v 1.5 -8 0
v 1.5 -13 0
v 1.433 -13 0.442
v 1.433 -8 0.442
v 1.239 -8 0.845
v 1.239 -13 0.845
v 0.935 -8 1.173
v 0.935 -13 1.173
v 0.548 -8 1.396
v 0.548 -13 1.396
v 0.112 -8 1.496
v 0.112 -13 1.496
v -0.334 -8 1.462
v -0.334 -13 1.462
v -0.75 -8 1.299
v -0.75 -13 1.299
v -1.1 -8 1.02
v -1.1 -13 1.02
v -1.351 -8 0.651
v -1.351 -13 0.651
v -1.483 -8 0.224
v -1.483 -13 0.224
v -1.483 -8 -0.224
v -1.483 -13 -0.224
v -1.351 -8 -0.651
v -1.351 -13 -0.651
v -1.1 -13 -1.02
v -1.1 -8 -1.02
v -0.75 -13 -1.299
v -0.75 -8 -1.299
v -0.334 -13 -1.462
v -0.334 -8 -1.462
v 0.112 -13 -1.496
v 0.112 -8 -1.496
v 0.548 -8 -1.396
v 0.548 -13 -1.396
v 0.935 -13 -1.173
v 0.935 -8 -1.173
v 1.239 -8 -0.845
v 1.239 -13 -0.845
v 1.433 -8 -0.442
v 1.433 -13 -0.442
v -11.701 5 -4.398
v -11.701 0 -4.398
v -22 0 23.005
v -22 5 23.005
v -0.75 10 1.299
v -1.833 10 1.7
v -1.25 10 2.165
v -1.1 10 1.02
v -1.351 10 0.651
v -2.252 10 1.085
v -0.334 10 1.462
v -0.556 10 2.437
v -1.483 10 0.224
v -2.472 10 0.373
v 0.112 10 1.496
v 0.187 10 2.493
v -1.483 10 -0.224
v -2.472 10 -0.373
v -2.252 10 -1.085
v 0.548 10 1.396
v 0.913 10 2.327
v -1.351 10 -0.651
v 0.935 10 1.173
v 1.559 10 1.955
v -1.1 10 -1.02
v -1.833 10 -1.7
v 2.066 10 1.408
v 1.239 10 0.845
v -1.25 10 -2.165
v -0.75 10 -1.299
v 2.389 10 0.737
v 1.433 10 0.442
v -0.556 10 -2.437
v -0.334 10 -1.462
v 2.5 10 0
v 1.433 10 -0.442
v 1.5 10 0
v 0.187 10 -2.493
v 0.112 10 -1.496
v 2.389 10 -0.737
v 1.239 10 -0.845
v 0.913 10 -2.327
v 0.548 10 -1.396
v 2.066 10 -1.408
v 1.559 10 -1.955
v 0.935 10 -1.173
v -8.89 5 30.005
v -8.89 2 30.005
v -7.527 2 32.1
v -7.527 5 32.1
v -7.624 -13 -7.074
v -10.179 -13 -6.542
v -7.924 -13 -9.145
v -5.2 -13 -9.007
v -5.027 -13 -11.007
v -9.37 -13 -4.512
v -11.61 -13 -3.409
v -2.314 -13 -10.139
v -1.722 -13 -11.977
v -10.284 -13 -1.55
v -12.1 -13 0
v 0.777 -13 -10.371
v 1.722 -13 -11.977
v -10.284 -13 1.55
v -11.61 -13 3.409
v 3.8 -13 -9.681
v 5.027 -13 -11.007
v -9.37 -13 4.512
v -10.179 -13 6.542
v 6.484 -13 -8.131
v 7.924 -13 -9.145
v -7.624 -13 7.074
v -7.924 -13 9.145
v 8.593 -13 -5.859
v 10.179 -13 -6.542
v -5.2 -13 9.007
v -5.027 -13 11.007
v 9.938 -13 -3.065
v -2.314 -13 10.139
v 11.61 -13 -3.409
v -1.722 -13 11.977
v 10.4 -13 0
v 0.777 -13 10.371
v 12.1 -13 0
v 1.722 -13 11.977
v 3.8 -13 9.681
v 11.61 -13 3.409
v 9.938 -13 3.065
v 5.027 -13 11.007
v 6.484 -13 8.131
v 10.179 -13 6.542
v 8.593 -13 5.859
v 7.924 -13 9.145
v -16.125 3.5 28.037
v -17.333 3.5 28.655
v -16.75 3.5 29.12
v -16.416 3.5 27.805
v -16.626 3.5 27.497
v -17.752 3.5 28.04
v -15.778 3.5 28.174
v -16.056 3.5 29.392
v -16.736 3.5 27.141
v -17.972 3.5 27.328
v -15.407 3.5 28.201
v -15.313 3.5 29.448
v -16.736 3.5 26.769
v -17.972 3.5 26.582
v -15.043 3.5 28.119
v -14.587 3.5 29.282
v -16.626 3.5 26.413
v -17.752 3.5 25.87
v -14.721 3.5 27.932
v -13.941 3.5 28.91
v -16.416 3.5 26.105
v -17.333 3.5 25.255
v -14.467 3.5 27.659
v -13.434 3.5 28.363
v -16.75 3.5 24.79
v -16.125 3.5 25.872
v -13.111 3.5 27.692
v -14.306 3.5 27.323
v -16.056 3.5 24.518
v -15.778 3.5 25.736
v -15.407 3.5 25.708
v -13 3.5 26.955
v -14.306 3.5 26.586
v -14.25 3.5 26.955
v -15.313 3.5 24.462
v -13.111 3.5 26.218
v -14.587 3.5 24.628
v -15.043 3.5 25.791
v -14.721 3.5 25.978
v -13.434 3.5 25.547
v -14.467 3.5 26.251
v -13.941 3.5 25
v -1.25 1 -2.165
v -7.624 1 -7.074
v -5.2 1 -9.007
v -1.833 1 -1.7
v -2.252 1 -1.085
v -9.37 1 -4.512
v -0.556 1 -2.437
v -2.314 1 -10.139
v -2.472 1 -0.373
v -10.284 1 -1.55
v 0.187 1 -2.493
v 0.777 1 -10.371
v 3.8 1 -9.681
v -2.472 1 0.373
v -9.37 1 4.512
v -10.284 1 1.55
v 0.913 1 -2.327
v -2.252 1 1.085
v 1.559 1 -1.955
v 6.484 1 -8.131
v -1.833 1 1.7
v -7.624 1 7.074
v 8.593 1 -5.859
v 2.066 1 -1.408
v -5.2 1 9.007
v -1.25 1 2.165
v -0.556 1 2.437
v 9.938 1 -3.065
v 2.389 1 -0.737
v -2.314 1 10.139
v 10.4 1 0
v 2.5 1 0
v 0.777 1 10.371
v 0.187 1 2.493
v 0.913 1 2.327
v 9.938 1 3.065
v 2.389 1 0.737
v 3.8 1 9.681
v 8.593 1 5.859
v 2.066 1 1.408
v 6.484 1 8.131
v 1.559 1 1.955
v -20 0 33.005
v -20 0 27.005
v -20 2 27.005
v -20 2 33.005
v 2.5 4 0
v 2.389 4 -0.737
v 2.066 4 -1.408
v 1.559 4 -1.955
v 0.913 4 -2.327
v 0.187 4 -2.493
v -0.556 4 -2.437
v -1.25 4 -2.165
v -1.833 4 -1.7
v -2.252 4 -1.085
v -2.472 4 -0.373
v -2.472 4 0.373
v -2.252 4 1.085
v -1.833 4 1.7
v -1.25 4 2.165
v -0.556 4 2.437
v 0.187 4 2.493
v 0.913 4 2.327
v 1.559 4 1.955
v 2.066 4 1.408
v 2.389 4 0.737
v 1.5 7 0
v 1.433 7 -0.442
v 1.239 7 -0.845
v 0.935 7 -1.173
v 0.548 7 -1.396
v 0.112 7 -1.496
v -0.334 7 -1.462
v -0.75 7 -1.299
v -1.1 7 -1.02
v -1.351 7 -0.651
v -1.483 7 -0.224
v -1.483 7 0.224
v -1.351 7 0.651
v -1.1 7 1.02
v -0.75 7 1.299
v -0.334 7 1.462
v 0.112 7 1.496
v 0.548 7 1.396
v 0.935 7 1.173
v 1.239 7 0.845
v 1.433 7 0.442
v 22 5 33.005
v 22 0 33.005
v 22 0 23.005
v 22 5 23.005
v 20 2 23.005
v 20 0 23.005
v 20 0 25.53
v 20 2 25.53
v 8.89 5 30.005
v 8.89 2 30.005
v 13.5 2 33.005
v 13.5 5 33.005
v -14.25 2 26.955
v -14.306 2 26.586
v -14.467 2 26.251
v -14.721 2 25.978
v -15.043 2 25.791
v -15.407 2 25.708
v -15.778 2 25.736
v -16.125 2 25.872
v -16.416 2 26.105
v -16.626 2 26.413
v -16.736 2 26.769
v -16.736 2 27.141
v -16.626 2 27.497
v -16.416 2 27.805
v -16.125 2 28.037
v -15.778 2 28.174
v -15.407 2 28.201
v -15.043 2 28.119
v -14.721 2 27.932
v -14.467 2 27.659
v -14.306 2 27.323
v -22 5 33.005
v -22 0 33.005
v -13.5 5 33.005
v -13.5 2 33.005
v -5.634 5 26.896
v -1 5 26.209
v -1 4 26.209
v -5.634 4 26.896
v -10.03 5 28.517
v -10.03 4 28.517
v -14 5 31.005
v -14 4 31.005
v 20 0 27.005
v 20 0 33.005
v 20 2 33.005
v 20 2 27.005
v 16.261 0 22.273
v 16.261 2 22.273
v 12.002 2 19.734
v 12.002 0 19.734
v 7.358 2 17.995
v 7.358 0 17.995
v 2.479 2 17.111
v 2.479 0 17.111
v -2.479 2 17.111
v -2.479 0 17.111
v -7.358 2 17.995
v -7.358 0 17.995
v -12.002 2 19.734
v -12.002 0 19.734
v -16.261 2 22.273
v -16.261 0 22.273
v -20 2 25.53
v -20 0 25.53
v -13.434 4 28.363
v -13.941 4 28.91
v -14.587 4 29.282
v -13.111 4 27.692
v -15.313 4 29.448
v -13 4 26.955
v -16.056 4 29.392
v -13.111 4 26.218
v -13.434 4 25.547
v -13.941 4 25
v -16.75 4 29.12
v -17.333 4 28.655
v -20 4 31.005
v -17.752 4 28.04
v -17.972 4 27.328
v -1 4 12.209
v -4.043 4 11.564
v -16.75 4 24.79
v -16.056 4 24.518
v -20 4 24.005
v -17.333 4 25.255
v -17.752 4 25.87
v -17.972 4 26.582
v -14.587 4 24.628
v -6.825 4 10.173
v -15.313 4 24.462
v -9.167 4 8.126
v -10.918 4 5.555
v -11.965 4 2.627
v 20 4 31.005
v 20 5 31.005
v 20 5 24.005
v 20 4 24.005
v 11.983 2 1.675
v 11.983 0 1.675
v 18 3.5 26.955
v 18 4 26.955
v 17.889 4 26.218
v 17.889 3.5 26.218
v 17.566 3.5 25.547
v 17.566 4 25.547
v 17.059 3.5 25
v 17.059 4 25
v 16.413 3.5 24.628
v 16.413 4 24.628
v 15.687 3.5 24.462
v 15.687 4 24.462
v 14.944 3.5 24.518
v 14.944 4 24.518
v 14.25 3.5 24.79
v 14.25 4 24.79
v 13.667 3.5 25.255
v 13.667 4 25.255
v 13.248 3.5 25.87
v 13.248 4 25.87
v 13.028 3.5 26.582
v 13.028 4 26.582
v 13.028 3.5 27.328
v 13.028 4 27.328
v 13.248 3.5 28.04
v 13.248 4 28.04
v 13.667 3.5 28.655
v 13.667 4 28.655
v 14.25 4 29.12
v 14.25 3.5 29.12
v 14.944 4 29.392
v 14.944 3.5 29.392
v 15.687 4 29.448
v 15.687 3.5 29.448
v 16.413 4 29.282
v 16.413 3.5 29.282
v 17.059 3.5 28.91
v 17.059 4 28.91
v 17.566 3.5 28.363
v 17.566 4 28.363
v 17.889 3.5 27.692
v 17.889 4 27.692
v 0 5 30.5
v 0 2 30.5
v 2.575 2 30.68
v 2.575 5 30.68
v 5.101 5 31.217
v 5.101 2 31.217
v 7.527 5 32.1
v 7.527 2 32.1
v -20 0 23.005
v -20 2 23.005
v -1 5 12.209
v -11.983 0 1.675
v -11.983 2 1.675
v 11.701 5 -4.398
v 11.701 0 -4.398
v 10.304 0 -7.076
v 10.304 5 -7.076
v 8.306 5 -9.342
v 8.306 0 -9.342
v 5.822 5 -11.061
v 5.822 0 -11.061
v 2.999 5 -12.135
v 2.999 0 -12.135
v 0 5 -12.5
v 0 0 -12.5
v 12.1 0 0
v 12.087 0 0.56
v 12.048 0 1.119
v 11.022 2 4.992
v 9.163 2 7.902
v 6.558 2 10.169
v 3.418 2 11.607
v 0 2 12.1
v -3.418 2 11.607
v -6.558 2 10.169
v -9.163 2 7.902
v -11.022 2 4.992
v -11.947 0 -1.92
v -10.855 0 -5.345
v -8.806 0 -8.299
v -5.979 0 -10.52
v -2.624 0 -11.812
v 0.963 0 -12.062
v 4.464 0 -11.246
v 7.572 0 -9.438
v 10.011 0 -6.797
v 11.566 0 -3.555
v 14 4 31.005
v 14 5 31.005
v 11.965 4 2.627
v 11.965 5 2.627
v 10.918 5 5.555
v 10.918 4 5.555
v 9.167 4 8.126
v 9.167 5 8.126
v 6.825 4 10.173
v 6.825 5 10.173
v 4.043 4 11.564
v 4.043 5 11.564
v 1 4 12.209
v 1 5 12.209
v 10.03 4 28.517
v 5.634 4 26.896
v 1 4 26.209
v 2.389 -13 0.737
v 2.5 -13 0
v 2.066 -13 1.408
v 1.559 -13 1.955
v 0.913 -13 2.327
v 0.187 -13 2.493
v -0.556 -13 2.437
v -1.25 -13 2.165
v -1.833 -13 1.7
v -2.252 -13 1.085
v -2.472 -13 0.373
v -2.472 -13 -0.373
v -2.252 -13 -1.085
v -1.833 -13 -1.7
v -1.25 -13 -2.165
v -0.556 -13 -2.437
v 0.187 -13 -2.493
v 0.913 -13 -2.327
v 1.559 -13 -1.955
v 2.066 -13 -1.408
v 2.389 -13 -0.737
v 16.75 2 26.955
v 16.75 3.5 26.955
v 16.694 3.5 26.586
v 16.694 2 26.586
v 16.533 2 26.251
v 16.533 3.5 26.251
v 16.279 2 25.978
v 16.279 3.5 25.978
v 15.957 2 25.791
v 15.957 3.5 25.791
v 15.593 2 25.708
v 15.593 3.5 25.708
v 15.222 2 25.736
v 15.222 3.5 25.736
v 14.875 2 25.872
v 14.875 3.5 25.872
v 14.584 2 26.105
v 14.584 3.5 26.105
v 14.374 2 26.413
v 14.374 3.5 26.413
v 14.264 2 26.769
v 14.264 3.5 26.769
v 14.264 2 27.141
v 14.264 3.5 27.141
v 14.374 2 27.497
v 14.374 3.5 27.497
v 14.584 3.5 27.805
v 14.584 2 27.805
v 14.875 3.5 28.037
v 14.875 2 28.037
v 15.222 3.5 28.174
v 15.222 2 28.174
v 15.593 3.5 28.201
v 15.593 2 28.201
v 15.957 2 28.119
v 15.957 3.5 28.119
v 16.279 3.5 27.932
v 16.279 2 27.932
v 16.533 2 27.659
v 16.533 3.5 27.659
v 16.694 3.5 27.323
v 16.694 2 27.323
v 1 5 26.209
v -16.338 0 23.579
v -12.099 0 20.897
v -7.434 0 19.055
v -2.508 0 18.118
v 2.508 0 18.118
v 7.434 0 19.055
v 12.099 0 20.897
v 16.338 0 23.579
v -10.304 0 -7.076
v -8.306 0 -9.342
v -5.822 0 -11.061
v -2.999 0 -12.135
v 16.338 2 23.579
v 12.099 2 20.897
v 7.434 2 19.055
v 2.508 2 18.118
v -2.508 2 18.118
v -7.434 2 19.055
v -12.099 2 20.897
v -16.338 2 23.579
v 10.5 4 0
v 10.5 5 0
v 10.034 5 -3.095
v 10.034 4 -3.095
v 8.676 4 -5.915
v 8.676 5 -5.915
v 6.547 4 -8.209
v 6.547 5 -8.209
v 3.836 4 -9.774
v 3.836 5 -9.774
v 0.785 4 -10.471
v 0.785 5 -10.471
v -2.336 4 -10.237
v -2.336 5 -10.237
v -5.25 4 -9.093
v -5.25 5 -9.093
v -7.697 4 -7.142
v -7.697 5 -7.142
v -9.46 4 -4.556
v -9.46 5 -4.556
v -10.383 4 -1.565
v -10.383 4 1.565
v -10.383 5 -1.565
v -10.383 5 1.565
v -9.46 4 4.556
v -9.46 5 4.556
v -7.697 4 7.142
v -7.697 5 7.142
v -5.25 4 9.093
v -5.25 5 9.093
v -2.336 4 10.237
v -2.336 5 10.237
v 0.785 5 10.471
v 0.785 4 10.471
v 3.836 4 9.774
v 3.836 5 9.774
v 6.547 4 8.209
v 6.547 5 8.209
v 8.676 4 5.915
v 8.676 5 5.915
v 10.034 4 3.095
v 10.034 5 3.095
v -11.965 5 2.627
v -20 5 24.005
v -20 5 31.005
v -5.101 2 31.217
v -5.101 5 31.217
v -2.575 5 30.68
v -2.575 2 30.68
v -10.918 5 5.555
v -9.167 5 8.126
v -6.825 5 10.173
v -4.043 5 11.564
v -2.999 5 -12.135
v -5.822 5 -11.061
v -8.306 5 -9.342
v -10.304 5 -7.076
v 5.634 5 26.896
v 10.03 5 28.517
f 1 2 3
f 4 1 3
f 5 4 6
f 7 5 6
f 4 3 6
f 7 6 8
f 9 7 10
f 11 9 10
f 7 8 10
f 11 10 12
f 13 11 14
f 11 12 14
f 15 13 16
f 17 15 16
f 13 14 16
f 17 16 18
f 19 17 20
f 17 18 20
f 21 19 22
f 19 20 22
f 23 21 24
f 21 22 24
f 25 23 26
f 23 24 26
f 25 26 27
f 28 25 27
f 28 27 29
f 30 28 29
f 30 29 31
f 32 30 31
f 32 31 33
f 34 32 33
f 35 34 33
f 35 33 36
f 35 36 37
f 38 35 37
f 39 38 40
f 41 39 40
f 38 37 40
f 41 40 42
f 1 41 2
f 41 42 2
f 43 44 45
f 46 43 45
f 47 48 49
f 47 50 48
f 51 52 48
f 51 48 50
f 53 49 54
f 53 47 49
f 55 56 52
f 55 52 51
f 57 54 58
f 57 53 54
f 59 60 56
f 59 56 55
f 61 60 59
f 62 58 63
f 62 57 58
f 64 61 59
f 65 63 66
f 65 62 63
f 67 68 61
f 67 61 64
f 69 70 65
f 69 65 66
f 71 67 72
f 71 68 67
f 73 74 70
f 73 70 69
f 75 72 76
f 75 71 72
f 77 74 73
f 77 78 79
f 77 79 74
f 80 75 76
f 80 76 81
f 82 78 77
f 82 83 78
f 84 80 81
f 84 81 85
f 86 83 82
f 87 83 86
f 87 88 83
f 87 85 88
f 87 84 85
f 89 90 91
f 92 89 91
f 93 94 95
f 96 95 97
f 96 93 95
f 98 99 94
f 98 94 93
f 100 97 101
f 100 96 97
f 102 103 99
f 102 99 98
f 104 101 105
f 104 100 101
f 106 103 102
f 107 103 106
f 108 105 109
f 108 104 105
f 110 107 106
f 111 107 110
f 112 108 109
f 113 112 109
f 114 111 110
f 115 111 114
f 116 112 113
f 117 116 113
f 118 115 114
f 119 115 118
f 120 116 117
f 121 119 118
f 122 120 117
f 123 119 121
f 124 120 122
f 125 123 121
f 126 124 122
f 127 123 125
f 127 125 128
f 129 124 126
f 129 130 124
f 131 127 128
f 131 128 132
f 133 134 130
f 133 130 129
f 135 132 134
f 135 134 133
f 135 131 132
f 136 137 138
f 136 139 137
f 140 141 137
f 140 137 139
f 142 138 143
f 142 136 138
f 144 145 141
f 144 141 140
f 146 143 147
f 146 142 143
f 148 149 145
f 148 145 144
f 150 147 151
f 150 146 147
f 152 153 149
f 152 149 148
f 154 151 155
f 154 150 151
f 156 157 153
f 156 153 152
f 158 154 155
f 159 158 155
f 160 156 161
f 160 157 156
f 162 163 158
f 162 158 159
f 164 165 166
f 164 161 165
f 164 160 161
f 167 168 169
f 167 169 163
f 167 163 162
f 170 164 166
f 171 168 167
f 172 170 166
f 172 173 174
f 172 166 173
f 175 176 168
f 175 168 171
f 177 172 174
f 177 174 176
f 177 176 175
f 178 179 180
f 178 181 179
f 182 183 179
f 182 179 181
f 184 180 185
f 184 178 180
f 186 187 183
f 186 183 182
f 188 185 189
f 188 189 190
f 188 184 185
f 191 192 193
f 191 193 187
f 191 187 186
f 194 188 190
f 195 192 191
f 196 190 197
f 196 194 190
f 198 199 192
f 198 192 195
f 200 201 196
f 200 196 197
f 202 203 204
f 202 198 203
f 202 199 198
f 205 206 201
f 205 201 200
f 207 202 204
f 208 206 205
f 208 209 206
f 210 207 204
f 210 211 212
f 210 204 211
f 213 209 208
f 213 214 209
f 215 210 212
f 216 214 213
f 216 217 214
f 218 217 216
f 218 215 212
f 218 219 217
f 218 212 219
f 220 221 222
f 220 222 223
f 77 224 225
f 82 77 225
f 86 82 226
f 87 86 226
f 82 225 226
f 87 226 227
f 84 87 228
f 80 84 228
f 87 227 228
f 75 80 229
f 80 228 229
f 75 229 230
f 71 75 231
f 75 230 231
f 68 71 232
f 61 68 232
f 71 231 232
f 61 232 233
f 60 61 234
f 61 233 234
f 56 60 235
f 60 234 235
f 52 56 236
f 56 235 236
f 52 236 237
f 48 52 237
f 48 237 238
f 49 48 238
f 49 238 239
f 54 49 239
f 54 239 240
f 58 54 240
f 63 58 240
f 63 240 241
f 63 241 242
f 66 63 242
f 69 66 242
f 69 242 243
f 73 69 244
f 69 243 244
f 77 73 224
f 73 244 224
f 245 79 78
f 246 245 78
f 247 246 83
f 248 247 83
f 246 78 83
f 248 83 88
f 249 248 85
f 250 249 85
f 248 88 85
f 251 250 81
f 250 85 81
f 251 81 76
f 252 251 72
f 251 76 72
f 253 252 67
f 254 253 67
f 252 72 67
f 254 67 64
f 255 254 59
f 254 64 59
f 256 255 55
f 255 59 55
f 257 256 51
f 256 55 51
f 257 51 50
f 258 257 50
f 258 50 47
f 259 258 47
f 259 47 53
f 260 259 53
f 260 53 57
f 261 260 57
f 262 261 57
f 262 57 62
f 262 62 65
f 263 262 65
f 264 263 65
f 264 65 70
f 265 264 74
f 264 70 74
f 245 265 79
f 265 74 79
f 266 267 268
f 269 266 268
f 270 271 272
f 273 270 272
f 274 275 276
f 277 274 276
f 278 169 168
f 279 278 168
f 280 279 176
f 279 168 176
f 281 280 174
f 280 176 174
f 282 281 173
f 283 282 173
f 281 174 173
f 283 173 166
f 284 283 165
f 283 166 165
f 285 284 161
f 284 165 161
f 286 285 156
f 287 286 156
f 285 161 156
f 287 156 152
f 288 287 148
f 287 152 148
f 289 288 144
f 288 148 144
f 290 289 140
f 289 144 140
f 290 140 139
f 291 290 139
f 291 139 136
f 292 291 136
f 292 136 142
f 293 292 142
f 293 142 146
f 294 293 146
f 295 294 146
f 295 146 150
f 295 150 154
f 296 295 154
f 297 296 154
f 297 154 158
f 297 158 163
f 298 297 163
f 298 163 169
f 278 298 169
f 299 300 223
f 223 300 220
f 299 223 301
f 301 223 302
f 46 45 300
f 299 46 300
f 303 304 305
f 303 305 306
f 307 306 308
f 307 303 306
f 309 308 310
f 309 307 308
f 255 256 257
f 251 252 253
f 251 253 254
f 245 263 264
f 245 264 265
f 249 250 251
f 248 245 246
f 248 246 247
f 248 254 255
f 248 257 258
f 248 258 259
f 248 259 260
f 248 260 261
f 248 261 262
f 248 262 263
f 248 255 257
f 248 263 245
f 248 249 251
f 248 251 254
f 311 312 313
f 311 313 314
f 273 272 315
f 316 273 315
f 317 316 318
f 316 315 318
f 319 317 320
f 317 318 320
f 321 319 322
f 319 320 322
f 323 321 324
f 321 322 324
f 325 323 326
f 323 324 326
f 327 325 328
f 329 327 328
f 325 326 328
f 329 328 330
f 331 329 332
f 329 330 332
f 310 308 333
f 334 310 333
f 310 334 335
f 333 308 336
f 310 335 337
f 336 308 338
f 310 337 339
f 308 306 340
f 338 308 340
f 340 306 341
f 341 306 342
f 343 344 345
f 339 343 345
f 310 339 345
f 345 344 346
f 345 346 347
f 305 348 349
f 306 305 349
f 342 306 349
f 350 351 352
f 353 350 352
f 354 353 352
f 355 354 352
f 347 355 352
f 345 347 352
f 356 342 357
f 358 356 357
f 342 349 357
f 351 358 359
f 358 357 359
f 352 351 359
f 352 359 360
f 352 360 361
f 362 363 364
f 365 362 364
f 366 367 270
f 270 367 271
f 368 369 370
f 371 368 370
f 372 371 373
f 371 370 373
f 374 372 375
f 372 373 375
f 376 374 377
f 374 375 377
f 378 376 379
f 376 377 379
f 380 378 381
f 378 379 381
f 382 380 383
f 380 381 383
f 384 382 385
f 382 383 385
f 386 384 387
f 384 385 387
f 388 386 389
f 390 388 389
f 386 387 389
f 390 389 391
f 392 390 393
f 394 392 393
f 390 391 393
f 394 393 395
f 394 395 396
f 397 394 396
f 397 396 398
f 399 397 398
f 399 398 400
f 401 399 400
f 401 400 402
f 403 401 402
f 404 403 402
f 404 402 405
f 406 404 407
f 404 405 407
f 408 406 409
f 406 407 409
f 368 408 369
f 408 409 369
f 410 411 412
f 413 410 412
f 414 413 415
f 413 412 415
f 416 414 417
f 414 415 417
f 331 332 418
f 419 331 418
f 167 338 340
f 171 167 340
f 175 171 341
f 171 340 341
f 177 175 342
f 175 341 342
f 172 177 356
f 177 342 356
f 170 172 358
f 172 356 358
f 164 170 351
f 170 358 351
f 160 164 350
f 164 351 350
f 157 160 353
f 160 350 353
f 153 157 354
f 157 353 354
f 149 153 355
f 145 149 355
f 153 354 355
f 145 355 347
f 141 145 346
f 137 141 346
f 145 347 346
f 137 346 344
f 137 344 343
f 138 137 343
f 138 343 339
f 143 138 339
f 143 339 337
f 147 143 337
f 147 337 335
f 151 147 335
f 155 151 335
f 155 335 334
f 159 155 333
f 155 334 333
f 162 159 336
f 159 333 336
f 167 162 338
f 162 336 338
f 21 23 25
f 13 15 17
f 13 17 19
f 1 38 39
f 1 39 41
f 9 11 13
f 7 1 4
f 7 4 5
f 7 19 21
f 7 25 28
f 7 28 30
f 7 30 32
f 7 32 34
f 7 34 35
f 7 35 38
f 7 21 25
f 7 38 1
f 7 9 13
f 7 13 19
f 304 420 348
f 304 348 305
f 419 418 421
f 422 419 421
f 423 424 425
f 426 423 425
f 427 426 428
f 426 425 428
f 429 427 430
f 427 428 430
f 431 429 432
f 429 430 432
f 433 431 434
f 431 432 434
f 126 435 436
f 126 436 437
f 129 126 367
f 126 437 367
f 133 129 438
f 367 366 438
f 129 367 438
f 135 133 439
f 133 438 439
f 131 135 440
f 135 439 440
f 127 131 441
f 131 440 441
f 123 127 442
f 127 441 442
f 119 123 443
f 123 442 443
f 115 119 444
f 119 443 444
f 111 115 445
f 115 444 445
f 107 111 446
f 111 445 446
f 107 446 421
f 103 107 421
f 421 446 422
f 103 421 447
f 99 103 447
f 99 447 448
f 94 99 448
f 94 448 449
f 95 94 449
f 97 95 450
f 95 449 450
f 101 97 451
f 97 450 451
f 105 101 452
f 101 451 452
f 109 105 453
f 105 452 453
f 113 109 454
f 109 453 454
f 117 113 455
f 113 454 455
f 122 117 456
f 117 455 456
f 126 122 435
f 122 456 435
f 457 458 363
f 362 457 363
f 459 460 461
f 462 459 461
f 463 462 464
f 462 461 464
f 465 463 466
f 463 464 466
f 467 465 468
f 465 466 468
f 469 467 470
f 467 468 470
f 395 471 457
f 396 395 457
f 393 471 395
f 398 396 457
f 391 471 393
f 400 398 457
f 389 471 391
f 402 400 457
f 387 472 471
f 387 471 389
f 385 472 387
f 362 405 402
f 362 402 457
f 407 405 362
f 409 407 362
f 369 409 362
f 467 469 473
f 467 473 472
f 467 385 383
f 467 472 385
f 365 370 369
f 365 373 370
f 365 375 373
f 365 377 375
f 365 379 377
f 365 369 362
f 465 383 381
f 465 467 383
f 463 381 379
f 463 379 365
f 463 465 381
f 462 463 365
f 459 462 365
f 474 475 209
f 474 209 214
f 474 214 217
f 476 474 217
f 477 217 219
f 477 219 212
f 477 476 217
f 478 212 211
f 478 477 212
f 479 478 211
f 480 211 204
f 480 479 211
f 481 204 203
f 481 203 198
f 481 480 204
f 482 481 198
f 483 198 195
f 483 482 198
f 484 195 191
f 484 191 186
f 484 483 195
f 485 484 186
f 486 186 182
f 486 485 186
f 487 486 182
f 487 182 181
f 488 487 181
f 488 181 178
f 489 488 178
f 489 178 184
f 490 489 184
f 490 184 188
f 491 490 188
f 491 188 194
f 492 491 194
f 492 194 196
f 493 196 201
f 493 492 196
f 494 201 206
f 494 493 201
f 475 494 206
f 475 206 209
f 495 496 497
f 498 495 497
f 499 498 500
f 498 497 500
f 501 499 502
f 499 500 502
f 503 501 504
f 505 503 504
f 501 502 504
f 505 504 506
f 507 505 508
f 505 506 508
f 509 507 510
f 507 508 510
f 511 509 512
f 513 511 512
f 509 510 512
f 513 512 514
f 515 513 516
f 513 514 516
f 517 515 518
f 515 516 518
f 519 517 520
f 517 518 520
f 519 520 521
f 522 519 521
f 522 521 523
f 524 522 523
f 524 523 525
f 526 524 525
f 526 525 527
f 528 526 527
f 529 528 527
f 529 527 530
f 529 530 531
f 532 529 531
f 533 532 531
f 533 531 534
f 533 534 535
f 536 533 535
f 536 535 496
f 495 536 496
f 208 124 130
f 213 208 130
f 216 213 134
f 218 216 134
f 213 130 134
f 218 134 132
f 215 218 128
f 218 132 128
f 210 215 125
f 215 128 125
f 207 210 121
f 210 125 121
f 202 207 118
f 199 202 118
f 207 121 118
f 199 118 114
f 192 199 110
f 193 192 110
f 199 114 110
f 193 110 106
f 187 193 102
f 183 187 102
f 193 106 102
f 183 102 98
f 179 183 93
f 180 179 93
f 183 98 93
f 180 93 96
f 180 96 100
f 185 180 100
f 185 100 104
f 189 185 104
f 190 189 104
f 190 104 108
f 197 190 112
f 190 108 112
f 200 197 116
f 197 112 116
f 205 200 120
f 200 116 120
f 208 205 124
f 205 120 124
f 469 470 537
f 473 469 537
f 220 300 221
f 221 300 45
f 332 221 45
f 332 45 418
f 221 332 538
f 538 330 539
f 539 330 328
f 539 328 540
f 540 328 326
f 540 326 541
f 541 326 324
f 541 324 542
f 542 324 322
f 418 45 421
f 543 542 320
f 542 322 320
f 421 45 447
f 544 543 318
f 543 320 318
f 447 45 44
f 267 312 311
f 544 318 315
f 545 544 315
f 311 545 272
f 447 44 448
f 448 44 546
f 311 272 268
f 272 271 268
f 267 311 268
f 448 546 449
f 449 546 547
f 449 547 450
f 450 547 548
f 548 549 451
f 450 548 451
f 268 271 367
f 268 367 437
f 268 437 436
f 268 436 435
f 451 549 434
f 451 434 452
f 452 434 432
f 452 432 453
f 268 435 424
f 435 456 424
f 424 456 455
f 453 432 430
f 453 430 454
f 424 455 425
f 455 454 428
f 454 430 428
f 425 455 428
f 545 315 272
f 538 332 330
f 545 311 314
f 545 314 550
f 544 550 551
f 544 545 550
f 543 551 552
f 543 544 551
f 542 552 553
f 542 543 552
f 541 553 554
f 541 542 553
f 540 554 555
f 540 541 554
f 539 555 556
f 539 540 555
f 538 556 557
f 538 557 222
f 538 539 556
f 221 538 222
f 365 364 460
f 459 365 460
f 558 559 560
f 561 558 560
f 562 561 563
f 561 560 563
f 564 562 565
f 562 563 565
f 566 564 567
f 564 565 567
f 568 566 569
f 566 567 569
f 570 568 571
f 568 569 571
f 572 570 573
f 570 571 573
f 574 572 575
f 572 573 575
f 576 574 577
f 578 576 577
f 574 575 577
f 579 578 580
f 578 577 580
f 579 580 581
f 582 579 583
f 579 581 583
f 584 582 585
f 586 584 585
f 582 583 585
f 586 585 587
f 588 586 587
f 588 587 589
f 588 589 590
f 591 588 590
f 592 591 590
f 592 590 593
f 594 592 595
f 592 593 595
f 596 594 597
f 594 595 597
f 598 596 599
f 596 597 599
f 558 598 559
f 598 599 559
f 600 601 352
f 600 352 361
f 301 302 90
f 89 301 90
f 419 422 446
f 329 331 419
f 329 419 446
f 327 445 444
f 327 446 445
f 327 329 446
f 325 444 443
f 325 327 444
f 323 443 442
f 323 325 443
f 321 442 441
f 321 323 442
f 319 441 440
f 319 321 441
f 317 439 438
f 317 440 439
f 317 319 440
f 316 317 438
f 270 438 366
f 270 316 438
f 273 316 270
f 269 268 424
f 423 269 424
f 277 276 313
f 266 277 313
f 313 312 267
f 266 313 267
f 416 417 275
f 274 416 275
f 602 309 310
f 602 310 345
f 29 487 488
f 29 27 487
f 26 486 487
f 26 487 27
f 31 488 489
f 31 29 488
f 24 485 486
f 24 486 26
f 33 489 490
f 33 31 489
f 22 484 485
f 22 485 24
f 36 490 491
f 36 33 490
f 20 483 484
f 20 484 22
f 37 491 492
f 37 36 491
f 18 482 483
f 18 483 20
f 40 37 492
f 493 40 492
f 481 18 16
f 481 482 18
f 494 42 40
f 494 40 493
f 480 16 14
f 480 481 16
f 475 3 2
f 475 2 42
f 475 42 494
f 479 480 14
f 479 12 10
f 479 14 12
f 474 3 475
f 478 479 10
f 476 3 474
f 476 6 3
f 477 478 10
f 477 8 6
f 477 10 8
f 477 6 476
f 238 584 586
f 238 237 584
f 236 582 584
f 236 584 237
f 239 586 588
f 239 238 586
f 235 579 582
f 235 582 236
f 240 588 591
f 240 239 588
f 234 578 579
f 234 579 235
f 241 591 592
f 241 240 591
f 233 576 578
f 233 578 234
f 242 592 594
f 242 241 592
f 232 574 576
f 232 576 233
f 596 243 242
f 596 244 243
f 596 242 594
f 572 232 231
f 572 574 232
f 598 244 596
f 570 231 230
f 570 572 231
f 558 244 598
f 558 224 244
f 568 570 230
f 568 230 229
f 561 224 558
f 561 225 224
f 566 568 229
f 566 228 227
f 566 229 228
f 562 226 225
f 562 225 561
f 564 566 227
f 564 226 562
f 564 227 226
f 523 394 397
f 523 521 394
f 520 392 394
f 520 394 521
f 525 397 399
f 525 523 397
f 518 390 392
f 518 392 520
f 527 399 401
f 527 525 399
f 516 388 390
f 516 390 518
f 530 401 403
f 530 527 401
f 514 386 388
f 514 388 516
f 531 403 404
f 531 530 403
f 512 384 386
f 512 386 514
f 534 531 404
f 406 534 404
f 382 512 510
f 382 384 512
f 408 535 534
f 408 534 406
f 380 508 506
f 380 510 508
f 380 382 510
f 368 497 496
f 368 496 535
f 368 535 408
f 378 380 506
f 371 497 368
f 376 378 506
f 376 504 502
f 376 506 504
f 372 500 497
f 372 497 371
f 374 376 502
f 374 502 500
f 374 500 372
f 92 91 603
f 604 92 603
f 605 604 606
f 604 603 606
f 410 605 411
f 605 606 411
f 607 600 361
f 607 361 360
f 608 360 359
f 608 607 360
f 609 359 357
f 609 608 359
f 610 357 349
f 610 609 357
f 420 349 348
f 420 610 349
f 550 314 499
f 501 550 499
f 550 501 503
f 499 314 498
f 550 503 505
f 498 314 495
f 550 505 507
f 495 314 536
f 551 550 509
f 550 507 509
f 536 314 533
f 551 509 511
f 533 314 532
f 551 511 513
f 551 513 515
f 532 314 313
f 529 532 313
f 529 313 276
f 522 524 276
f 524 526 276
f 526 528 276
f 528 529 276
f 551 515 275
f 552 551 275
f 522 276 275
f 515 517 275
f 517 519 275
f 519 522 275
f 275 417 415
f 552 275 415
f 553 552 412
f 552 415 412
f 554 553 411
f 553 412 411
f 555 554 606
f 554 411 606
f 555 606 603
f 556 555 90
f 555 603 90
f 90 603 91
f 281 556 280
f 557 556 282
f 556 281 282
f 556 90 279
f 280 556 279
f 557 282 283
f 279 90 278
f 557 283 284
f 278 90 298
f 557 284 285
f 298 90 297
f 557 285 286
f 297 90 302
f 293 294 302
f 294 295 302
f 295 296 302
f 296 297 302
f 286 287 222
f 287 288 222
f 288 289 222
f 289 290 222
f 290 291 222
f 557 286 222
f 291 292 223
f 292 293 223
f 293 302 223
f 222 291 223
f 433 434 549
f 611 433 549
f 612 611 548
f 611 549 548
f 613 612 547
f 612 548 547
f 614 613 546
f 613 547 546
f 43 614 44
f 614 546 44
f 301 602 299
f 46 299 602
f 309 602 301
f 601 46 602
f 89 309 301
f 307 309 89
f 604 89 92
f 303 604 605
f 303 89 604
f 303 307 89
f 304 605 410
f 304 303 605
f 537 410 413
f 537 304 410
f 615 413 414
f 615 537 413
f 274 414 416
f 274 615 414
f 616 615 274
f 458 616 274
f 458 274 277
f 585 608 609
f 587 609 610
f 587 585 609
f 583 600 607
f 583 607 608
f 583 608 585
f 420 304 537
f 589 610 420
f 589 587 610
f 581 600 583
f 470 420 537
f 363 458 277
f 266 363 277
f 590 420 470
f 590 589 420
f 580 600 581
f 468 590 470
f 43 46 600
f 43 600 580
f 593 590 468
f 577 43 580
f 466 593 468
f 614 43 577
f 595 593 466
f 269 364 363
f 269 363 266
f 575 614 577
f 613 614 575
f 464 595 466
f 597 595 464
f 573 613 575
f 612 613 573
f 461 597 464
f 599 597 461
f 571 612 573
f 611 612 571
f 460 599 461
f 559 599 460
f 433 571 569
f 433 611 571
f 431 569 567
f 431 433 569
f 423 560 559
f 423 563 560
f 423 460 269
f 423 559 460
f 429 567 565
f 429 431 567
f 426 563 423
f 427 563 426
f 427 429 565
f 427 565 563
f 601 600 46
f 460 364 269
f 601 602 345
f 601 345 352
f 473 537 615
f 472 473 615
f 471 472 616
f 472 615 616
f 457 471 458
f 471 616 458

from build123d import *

# Parameters (mm, degrees)
BOSS_EXTRUDE1_DEPTH = 5
SKETCH3_R           = 10.5
CUT_EXTRUDE1_DEPTH  = 1
SKETCH4_R           = 2.5
BOSS_EXTRUDE2_DEPTH = 6
SKETCH5_R           = 1.5
CUT_EXTRUDE2_DEPTH  = 3
CUT_EXTRUDE3_DEPTH  = 1
SKETCH7_R           = 1.25
CUT_EXTRUDE4_DEPTH  = 5
SKETCH8_R           = 2.5
CUT_EXTRUDE5_DEPTH  = 0.5
CUT_EXTRUDE6_DEPTH  = 2
CUT_EXTRUDE7_DEPTH  = 2
SKETCH12_R          = 12.1
BOSS_EXTRUDE3_DEPTH = 15
SKETCH13_R          = 10.4
SKETCH13_R_2        = 2.5
CUT_EXTRUDE8_DEPTH  = 14
SKETCH14_R          = 1.5
CUT_EXTRUDE9_DEPTH  = 5


with BuildPart() as part:
    # Sketch1 → Boss-Extrude1 (new body)
    with BuildSketch(Plane(origin=(0, 0, 0), x_dir=(1, 0, 0), z_dir=(0, 1, 0))):
        with BuildLine():
            Line((-22, -23.004932369), (-22, -33.004932369))
            Line((-22, -33.004932369), (-13.5, -33.004932369))
            Line((-13.5, -33.004932369), (-8.890227771, -30.004932369))
            Line((-8.890227771, -30.004932369), (-7.526591408, -32.100283382))
            ThreePointArc((-7.526591408, -32.100283382), (-3.847417482, -30.904492858), (0, -30.5))
            Line((0, -30.5), (0, 12.5))
            ThreePointArc((0, 12.5), (-7.116131574, 10.276705281), (-11.700861907, 4.397707428))
            Line((-11.700861907, 4.397707428), (-22, -23.004932369))
        make_face()
        with BuildLine():
            ThreePointArc((11.700861907, 4.397707428), (7.116131574, 10.276705281), (0, 12.5))
            Line((0, 12.5), (0, -30.5))
            ThreePointArc((0, -30.5), (3.847417482, -30.904492858), (7.526591408, -32.100283382))
            Line((7.526591408, -32.100283382), (8.890227771, -30.004932369))
            Line((8.890227771, -30.004932369), (13.5, -33.004932369))
            Line((13.5, -33.004932369), (22, -33.004932369))
            Line((22, -33.004932369), (22, -23.004932369))
            Line((22, -23.004932369), (11.700861907, 4.397707428))
        make_face()
    extrude(amount=BOSS_EXTRUDE1_DEPTH)

    # Sketch3 → Cut-Extrude1 (cut)
    with BuildSketch(Plane(origin=(0, 5, 0), x_dir=(1, 0, 0), z_dir=(0, 1, 0))):
        Circle(SKETCH3_R)
    extrude(amount=-CUT_EXTRUDE1_DEPTH, mode=Mode.SUBTRACT)

    # Sketch4 → Boss-Extrude2 (add)
    with BuildSketch(Plane(origin=(0, 4, 0), x_dir=(1, 0, 0), z_dir=(0, 1, 0))):
        Circle(SKETCH4_R)
    extrude(amount=BOSS_EXTRUDE2_DEPTH)

    # Sketch5 → Cut-Extrude2 (cut)
    with BuildSketch(Plane(origin=(0, 10, 0), x_dir=(1, 0, 0), z_dir=(0, 1, 0))):
        Circle(SKETCH5_R)
    extrude(amount=-CUT_EXTRUDE2_DEPTH, mode=Mode.SUBTRACT)

    # Sketch6 → Cut-Extrude3 (cut)
    with BuildSketch(Plane(origin=(0, 5, 0), x_dir=(1, 0, 0), z_dir=(0, 1, 0))):
        with BuildLine():
            Line((-1, -12.209115447), (-1, -26.209115447))
            ThreePointArc((-1, -26.209115447), (-7.874005651, -27.593208423), (-14, -31.004932369))
            Line((-14, -31.004932369), (-20, -31.004932369))
            Line((-20, -31.004932369), (-20, -24.004932369))
            Line((-20, -24.004932369), (-11.96508369, -2.626646587))
            ThreePointArc((-11.96508369, -2.626646587), (-8.060972406, -9.224056801), (-1, -12.209115447))
        make_face()
        with BuildLine():
            Line((20, -24.004932369), (11.96508369, -2.626646587))
            ThreePointArc((11.96508369, -2.626646587), (8.060972406, -9.224056801), (1, -12.209115447))
            Line((1, -12.209115447), (1, -26.209115447))
            ThreePointArc((1, -26.209115447), (7.874005651, -27.593208423), (14, -31.004932369))
            Line((14, -31.004932369), (20, -31.004932369))
            Line((20, -31.004932369), (20, -24.004932369))
        make_face()
    extrude(amount=-CUT_EXTRUDE3_DEPTH, mode=Mode.SUBTRACT)

    # Sketch7 → Cut-Extrude4 (cut, through all)
    with BuildSketch(Plane(origin=(0, 4, 0), x_dir=(1, 0, 0), z_dir=(0, 1, 0))):
        with Locations((-15.5, -26.954932369)):
            Circle(SKETCH7_R)
        with Locations((15.5, -26.954932369)):
            Circle(SKETCH7_R)
    extrude(amount=-CUT_EXTRUDE4_DEPTH, mode=Mode.SUBTRACT)

    # Sketch8 → Cut-Extrude5 (cut)
    with BuildSketch(Plane(origin=(0, 4, 0), x_dir=(1, 0, 0), z_dir=(0, 1, 0))):
        with Locations((-15.5, -26.954932369)):
            Circle(SKETCH8_R)
        with Locations((15.5, -26.954932369)):
            Circle(SKETCH8_R)
    extrude(amount=-CUT_EXTRUDE5_DEPTH, mode=Mode.SUBTRACT)

    # Sketch9 → Cut-Extrude6 (cut)
    with BuildSketch(Plane.XZ):
        with BuildLine():
            Line((20, 33.004932369), (20, 27.004932369))
            ThreePointArc((20, 27.004932369), (0, 18), (-20, 27.004932369))
            Line((-20, 27.004932369), (-20, 33.004932369))
            Line((-20, 33.004932369), (20, 33.004932369))
        make_face()
    extrude(amount=-CUT_EXTRUDE6_DEPTH, mode=Mode.SUBTRACT)

    # Sketch11 → Cut-Extrude7 (cut)
    with BuildSketch(Plane.XZ):
        with BuildLine():
            Line((-20, 23.004932369), (-10.073125454, -3.40723582))
            ThreePointArc((-10.073125454, -3.40723582), (0, -10.633772254), (10.073125454, -3.40723582))
            Line((10.073125454, -3.40723582), (20, 23.004932369))
            Line((20, 23.004932369), (20, 25.529642354))
            ThreePointArc((20, 25.529642354), (0, 17.000016389), (-20, 25.529642354))
            Line((-20, 25.529642354), (-20, 23.004932369))
        make_face()
    extrude(amount=-CUT_EXTRUDE7_DEPTH, mode=Mode.SUBTRACT)

    # Sketch12 → Boss-Extrude3 (add)
    with BuildSketch(Plane.XZ.offset(-2)):
        Circle(SKETCH12_R)
    extrude(amount=BOSS_EXTRUDE3_DEPTH)

    # Sketch13 → Cut-Extrude8 (cut)
    with BuildSketch(Plane.XZ.offset(13)):
        Circle(SKETCH13_R)
        Circle(SKETCH13_R_2, mode=Mode.SUBTRACT)
    extrude(amount=-CUT_EXTRUDE8_DEPTH, mode=Mode.SUBTRACT)

    # Sketch14 → Cut-Extrude9 (cut)
    with BuildSketch(Plane.XZ.offset(13)):
        Circle(SKETCH14_R)
    extrude(amount=-CUT_EXTRUDE9_DEPTH, mode=Mode.SUBTRACT)


solid = part.part
